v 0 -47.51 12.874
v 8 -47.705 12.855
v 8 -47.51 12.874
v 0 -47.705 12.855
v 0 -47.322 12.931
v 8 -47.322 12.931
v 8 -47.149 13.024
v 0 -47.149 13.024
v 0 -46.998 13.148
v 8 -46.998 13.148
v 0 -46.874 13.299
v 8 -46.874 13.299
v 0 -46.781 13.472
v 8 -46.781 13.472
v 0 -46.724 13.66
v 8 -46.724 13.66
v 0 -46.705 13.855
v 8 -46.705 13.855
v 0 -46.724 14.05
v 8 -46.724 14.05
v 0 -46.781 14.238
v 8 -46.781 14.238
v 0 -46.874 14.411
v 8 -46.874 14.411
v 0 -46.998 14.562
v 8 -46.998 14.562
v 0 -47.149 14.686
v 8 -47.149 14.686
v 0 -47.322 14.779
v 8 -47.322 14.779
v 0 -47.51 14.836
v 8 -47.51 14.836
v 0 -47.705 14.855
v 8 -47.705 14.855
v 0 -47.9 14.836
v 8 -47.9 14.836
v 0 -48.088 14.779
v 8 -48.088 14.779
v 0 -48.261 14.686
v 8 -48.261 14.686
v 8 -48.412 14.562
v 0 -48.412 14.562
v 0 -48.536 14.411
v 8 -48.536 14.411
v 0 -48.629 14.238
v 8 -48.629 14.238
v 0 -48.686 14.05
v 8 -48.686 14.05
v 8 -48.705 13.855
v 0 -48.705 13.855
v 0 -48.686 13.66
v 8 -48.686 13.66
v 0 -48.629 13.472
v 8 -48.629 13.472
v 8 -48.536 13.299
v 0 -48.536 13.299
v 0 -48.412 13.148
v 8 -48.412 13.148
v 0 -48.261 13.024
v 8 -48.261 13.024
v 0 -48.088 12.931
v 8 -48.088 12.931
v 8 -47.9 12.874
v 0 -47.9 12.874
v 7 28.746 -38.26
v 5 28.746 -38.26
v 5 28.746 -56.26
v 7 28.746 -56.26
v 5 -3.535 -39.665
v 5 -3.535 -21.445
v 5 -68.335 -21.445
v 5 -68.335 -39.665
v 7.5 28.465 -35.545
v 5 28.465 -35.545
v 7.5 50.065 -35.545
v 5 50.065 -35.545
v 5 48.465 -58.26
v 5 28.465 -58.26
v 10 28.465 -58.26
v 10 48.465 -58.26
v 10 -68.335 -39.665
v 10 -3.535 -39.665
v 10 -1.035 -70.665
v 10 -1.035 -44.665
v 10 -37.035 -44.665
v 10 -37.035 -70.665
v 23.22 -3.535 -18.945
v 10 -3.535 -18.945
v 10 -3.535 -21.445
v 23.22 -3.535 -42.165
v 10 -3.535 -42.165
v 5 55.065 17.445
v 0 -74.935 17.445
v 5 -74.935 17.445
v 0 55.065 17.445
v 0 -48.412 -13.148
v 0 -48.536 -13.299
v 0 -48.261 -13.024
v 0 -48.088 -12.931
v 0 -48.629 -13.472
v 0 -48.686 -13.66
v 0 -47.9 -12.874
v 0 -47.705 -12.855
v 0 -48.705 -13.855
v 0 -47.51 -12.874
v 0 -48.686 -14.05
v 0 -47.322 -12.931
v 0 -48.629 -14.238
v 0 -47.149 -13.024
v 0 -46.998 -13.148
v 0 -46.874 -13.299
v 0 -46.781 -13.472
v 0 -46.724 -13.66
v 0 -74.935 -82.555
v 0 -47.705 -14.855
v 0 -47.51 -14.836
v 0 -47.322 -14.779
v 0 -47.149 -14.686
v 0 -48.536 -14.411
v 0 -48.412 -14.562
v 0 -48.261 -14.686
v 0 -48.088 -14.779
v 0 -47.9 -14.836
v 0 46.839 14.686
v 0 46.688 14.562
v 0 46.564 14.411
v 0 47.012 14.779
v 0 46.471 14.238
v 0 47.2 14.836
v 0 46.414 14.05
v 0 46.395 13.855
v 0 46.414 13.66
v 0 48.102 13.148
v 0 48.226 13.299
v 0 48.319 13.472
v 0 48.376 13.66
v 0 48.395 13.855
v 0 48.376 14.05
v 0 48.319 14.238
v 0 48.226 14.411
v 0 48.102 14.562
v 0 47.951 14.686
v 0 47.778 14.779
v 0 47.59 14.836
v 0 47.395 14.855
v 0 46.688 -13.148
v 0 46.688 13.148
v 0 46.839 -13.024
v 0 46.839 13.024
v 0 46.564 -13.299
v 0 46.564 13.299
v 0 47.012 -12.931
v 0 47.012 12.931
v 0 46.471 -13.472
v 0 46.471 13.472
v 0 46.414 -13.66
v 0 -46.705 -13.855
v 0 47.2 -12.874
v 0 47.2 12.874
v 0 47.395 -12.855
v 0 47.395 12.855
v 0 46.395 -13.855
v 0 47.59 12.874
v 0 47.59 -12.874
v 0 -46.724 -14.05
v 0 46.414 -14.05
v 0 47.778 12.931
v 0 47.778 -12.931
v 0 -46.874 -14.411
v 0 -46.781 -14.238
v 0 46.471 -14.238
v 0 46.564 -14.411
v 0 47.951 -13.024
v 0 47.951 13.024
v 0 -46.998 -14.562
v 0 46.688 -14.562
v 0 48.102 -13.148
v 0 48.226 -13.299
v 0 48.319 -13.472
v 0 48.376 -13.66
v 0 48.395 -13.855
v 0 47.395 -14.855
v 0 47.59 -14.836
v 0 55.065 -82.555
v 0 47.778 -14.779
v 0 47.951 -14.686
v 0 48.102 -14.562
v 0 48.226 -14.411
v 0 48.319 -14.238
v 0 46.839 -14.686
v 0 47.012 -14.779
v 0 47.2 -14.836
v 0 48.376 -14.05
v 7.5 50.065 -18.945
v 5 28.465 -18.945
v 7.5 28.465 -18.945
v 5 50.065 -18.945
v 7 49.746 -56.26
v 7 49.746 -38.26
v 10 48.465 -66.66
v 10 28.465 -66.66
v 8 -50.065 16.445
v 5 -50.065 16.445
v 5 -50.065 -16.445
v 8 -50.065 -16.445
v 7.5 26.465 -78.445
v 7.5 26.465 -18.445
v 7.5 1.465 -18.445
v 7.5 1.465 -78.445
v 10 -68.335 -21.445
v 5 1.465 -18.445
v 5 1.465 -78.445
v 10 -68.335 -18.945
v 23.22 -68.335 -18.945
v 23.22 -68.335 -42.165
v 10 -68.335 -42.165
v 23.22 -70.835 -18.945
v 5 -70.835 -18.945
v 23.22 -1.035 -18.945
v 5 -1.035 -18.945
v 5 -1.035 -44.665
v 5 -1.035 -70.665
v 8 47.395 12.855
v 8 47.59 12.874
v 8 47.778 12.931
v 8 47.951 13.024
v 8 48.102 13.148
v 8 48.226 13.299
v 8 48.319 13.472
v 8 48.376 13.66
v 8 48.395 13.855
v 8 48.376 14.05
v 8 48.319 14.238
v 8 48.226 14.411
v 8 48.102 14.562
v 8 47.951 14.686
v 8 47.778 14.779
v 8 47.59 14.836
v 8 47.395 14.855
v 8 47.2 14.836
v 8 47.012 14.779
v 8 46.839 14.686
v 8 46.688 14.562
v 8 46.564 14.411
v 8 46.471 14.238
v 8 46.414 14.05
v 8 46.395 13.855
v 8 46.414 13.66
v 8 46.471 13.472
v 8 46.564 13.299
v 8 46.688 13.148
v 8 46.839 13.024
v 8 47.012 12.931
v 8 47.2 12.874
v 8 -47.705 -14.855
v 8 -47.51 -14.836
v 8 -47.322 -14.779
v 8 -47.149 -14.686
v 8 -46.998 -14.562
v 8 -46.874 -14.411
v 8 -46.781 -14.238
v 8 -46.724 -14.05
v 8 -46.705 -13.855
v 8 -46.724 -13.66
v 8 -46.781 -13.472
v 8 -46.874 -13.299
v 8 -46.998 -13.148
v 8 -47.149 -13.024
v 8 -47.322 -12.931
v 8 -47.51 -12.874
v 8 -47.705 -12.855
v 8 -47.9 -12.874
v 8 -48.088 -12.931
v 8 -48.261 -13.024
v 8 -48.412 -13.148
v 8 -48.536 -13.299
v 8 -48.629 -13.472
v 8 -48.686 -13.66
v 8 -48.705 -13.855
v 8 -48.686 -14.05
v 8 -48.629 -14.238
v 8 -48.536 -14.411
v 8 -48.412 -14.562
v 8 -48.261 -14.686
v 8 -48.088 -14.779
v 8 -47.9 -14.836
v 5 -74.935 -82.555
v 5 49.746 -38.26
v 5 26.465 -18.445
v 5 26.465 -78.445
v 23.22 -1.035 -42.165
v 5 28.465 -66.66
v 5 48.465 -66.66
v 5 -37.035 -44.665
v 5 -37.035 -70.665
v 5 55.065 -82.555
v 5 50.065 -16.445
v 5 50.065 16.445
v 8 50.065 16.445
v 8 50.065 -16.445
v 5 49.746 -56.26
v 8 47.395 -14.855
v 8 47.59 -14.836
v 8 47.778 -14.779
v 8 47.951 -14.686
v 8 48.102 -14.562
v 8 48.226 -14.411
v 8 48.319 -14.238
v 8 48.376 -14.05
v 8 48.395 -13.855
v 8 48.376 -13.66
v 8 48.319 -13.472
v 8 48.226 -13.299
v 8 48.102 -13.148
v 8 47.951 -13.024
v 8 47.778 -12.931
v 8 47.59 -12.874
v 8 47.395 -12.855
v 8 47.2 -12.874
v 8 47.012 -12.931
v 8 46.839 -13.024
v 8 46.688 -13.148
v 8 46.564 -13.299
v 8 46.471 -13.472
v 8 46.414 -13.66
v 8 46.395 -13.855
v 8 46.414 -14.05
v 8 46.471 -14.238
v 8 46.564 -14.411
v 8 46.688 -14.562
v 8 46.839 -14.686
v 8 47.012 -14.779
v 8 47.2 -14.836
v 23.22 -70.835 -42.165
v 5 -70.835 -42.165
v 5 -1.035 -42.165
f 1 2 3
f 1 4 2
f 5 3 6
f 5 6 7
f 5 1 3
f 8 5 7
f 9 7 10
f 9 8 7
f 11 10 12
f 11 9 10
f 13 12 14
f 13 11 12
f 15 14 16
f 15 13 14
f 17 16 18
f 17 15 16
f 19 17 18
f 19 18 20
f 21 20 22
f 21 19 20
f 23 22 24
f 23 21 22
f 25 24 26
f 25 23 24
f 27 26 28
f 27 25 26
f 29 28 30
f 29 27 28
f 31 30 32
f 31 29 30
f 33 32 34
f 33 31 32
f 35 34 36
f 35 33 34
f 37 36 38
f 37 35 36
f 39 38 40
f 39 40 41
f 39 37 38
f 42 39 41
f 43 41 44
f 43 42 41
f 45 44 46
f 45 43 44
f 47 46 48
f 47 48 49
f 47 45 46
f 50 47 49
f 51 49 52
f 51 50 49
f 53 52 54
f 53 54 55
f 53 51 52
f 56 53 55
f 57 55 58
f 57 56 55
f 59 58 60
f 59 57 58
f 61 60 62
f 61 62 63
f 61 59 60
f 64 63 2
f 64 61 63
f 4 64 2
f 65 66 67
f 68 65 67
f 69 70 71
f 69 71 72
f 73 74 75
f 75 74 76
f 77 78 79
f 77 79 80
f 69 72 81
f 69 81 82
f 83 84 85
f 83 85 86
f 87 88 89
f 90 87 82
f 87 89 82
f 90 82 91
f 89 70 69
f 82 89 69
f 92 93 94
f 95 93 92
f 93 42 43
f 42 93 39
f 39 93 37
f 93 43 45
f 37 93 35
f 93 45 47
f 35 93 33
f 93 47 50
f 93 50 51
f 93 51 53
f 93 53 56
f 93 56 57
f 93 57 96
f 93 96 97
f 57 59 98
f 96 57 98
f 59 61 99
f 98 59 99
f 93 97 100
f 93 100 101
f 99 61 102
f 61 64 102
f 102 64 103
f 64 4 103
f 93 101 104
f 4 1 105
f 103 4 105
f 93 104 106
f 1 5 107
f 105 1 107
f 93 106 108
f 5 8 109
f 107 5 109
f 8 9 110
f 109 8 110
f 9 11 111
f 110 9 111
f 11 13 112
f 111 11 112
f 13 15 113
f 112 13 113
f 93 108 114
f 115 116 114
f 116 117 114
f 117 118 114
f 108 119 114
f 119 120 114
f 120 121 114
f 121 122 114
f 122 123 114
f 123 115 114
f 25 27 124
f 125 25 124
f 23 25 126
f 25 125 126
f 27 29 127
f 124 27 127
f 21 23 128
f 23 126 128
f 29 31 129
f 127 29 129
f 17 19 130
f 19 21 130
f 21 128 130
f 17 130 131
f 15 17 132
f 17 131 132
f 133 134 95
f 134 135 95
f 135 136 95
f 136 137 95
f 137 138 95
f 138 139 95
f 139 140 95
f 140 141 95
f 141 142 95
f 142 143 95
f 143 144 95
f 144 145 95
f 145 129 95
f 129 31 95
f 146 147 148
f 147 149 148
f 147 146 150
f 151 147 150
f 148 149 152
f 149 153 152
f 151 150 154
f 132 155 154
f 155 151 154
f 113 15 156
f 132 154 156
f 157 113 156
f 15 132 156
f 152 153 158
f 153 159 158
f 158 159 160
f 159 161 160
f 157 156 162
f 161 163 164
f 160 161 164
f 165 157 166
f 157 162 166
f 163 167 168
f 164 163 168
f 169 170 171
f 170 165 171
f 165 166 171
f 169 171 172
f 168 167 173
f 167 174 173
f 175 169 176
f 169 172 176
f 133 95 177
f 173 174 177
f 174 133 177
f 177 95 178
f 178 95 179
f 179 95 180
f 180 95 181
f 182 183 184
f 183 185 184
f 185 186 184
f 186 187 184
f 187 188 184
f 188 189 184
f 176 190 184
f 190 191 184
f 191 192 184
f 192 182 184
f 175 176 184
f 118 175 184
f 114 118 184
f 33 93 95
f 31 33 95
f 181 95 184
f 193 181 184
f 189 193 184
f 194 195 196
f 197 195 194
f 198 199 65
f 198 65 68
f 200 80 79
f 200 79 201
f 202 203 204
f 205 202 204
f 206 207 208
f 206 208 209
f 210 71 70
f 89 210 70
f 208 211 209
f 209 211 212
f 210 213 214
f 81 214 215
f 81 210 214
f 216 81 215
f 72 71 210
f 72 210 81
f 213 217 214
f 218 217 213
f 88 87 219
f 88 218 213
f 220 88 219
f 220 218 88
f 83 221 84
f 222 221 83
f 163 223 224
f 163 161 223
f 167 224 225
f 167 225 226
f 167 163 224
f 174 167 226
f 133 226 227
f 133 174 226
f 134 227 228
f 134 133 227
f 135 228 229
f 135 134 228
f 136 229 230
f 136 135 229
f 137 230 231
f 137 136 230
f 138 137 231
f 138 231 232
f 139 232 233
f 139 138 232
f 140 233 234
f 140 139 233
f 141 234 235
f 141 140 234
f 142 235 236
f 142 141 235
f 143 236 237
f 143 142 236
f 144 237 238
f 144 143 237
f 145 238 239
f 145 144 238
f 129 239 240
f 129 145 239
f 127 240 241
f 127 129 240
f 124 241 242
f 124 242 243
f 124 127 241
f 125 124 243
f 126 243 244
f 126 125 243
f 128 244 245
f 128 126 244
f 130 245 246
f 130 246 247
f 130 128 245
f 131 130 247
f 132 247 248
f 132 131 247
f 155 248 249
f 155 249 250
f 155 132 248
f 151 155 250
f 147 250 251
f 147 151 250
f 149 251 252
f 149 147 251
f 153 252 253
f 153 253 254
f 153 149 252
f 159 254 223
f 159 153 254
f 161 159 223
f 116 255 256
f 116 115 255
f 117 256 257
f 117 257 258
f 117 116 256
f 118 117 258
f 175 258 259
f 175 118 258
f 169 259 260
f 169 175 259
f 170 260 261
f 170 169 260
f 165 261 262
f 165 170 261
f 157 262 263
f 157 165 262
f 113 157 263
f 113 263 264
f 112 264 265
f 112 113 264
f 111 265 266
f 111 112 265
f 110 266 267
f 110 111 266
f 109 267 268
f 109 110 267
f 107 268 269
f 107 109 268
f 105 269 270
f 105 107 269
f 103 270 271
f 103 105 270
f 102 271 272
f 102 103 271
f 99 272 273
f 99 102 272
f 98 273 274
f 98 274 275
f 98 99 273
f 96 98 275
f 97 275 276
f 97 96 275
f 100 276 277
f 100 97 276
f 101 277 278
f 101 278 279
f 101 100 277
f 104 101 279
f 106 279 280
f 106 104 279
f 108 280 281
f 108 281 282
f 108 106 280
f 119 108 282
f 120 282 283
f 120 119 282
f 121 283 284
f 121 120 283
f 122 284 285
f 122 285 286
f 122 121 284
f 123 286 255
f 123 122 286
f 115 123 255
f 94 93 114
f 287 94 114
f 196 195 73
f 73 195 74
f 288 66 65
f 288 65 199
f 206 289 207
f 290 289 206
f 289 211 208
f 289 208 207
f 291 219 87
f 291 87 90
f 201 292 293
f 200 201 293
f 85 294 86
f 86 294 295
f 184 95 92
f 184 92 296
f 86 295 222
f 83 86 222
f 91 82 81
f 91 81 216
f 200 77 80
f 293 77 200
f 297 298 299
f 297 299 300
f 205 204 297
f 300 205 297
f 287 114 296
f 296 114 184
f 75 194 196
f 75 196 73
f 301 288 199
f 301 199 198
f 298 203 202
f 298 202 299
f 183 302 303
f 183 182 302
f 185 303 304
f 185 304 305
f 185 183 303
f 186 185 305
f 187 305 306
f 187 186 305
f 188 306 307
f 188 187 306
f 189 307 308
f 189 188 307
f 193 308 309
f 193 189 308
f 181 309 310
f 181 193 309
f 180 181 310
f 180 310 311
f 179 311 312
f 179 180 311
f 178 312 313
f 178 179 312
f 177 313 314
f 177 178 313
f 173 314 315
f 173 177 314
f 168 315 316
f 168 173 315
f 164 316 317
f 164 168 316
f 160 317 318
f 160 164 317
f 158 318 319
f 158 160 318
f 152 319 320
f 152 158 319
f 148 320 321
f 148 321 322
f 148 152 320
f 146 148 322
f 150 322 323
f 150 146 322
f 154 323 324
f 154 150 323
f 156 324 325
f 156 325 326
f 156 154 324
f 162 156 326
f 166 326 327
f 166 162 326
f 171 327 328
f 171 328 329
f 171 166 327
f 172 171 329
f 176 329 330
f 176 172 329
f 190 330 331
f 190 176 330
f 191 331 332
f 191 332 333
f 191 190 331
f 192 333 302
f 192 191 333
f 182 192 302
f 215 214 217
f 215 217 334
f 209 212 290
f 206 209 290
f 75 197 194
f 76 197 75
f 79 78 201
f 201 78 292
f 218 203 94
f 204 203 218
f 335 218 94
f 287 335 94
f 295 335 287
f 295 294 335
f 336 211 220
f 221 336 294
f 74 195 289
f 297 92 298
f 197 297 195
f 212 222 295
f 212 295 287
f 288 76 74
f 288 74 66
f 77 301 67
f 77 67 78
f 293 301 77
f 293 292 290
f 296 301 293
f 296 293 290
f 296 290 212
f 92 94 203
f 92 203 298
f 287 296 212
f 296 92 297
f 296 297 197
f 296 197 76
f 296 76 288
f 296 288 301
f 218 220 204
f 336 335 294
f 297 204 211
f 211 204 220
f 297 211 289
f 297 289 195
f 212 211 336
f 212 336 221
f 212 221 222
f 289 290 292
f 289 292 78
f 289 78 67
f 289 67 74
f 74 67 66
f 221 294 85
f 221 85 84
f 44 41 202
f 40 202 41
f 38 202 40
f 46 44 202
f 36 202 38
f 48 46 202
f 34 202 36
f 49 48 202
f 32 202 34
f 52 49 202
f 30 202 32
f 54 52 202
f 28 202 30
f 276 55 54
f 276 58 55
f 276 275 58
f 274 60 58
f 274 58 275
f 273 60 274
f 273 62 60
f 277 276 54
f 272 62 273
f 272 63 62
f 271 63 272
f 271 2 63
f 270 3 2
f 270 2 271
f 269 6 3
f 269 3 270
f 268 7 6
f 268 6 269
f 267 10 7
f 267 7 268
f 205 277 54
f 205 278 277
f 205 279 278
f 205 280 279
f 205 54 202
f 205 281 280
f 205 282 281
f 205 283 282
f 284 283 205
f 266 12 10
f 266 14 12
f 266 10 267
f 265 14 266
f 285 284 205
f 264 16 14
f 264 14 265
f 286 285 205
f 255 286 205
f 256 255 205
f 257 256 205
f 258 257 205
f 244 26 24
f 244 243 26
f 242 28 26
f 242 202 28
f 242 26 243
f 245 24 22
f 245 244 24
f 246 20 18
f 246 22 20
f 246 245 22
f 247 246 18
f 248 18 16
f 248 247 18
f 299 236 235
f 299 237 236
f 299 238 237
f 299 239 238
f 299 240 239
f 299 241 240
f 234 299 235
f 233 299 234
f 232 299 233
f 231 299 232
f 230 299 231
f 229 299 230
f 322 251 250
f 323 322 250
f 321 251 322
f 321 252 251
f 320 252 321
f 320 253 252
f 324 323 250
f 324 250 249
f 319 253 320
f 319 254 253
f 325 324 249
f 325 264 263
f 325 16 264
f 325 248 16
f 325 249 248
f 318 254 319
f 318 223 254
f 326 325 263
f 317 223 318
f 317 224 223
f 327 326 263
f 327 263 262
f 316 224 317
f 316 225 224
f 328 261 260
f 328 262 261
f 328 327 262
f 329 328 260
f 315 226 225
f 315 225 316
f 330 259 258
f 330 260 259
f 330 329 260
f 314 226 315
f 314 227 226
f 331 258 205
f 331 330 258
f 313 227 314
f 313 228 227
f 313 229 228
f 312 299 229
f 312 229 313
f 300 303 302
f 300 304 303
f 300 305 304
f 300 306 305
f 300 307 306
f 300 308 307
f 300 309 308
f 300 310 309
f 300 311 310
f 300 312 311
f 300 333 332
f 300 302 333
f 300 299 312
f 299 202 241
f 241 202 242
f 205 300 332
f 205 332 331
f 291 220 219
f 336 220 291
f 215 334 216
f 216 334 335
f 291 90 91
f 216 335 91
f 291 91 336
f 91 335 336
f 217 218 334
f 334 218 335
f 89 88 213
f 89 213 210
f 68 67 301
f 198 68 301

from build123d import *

# Parameters (mm, degrees)
SKETCH1_W            = 100
SKETCH1_H            = 130
SKETCH1_W_2          = 32.89
SKETCH1_H_2          = 100.13
SKETCH1_R            = 1
BOSS_EXTRUDE1_DEPTH  = 5
SKETCH3_W            = 32.89
SKETCH3_H            = 100.13
SKETCH3_R            = 1
BOSS_EXTRUDE3_DEPTH  = 3
SKETCH4_W            = 16.6
SKETCH4_H            = 21.6
BOSS_EXTRUDE4_DEPTH  = 2.5
SKETCH5_W            = 60
SKETCH5_H            = 25
BOSS_EXTRUDE5_DEPTH  = 2.5
SKETCH6_W            = 18
SKETCH6_H            = 21
BOSS_EXTRUDE6_DEPTH  = 2
SKETCH7_W            = 8.4
SKETCH7_H            = 20
BOSS_EXTRUDE7_DEPTH  = 5
SKETCH9_W            = 2.5
SKETCH9_H            = 64.8
BOSS_EXTRUDE8_DEPTH  = 5
SKETCH10_W           = 23.22
SKETCH10_H           = 2.5
BOSS_EXTRUDE9_DEPTH  = 18.22
SKETCH12_W           = 26
SKETCH12_H           = 36
BOSS_EXTRUDE11_DEPTH = 5
SKETCH11_W           = 26
SKETCH11_H           = 36
BOSS_EXTRUDE10_DEPTH = 5


with BuildPart() as part:
    # Sketch1 → Boss-Extrude1 (new body)
    # profile 1 of 2: a face of its own
    with BuildSketch(Plane(origin=(0, 0, 0), x_dir=(0, 0, -1), z_dir=(1, 0, 0))):
        with Locations((32.555, -9.935)):
            Rectangle(SKETCH1_W, SKETCH1_H)
        Rectangle(SKETCH1_W_2, SKETCH1_H_2, mode=Mode.SUBTRACT)
    # profile 2 of 2: a face of its own
    with BuildSketch(Plane(origin=(0, 0, 0), x_dir=(0, 0, -1), z_dir=(1, 0, 0))):
        Rectangle(SKETCH1_W_2, SKETCH1_H_2)
        with Locations((-13.855, -47.705)):
            Circle(SKETCH1_R, mode=Mode.SUBTRACT)
        with Locations((13.855, -47.705)):
            Circle(SKETCH1_R, mode=Mode.SUBTRACT)
        with Locations((13.855, 47.395)):
            Circle(SKETCH1_R, mode=Mode.SUBTRACT)
        with Locations((-13.855, 47.395)):
            Circle(SKETCH1_R, mode=Mode.SUBTRACT)
    extrude(amount=BOSS_EXTRUDE1_DEPTH)

    # Sketch3 → Boss-Extrude3 (add)
    with BuildSketch(Plane(origin=(5, 0, 0), x_dir=(0, 0, -1), z_dir=(1, 0, 0))):
        Rectangle(SKETCH3_W, SKETCH3_H)
        with Locations((-13.855, 47.395)):
            Circle(SKETCH3_R, mode=Mode.SUBTRACT)
        with Locations((13.855, 47.395)):
            Circle(SKETCH3_R, mode=Mode.SUBTRACT)
        with Locations((13.855, -47.705)):
            Circle(SKETCH3_R, mode=Mode.SUBTRACT)
        with Locations((-13.855, -47.705)):
            Circle(SKETCH3_R, mode=Mode.SUBTRACT)
    extrude(amount=BOSS_EXTRUDE3_DEPTH)

    # Sketch4 → Boss-Extrude4 (add)
    with BuildSketch(Plane(origin=(5, 0, 0), x_dir=(0, 0, -1), z_dir=(1, 0, 0))):
        with Locations((27.245, 39.265)):
            Rectangle(SKETCH4_W, SKETCH4_H)
    extrude(amount=BOSS_EXTRUDE4_DEPTH)

    # Sketch5 → Boss-Extrude5 (add)
    with BuildSketch(Plane(origin=(5, 0, 0), x_dir=(0, 0, -1), z_dir=(1, 0, 0))):
        with Locations((48.445, 13.965)):
            Rectangle(SKETCH5_W, SKETCH5_H)
    extrude(amount=BOSS_EXTRUDE5_DEPTH)

    # Sketch6 → Boss-Extrude6 (add)
    with BuildSketch(Plane(origin=(5, 0, 0), x_dir=(0, 0, -1), z_dir=(1, 0, 0))):
        with Locations((47.260487744, 39.246233232)):
            Rectangle(SKETCH6_W, SKETCH6_H)
    extrude(amount=BOSS_EXTRUDE6_DEPTH)

    # Sketch7 → Boss-Extrude7 (add)
    with BuildSketch(Plane(origin=(5, 0, 0), x_dir=(0, 0, -1), z_dir=(1, 0, 0))):
        with Locations((62.460487744, 38.465)):
            Rectangle(SKETCH7_W, SKETCH7_H)
    extrude(amount=BOSS_EXTRUDE7_DEPTH)

    # Sketch9 → Boss-Extrude8 (add)
    with BuildSketch(Plane(origin=(5, 0, 0), x_dir=(0, 0, -1), z_dir=(1, 0, 0))):
        with Locations((20.195, -35.935)):
            Rectangle(SKETCH9_W, SKETCH9_H)
        with Locations((40.915, -35.935)):
            Rectangle(SKETCH9_W, SKETCH9_H)
    extrude(amount=BOSS_EXTRUDE8_DEPTH)

    # Sketch10 → Boss-Extrude9 (add)
    with BuildSketch(Plane(origin=(5, 0, 0), x_dir=(0, 0, -1), z_dir=(1, 0, 0))):
        with Locations((30.555, -69.585)):
            Rectangle(SKETCH10_W, SKETCH10_H)
        with Locations((30.555, -2.285)):
            Rectangle(SKETCH10_W, SKETCH10_H)
    extrude(amount=BOSS_EXTRUDE9_DEPTH)

    # Sketch12 → Boss-Extrude11 (add)
    with BuildSketch(Plane(origin=(5, 0, 0), x_dir=(0, 0, -1), z_dir=(1, 0, 0))):
        with Locations((57.665, -19.035)):
            Rectangle(SKETCH12_W, SKETCH12_H)
    extrude(amount=BOSS_EXTRUDE11_DEPTH)

    # Sketch11 → Boss-Extrude10 (add)
    with BuildSketch(Plane(origin=(5, 0, 0), x_dir=(0, 0, -1), z_dir=(1, 0, 0))):
        with Locations((57.665, -19.035)):
            Rectangle(SKETCH11_W, SKETCH11_H)
    extrude(amount=BOSS_EXTRUDE10_DEPTH)


solid = part.part
